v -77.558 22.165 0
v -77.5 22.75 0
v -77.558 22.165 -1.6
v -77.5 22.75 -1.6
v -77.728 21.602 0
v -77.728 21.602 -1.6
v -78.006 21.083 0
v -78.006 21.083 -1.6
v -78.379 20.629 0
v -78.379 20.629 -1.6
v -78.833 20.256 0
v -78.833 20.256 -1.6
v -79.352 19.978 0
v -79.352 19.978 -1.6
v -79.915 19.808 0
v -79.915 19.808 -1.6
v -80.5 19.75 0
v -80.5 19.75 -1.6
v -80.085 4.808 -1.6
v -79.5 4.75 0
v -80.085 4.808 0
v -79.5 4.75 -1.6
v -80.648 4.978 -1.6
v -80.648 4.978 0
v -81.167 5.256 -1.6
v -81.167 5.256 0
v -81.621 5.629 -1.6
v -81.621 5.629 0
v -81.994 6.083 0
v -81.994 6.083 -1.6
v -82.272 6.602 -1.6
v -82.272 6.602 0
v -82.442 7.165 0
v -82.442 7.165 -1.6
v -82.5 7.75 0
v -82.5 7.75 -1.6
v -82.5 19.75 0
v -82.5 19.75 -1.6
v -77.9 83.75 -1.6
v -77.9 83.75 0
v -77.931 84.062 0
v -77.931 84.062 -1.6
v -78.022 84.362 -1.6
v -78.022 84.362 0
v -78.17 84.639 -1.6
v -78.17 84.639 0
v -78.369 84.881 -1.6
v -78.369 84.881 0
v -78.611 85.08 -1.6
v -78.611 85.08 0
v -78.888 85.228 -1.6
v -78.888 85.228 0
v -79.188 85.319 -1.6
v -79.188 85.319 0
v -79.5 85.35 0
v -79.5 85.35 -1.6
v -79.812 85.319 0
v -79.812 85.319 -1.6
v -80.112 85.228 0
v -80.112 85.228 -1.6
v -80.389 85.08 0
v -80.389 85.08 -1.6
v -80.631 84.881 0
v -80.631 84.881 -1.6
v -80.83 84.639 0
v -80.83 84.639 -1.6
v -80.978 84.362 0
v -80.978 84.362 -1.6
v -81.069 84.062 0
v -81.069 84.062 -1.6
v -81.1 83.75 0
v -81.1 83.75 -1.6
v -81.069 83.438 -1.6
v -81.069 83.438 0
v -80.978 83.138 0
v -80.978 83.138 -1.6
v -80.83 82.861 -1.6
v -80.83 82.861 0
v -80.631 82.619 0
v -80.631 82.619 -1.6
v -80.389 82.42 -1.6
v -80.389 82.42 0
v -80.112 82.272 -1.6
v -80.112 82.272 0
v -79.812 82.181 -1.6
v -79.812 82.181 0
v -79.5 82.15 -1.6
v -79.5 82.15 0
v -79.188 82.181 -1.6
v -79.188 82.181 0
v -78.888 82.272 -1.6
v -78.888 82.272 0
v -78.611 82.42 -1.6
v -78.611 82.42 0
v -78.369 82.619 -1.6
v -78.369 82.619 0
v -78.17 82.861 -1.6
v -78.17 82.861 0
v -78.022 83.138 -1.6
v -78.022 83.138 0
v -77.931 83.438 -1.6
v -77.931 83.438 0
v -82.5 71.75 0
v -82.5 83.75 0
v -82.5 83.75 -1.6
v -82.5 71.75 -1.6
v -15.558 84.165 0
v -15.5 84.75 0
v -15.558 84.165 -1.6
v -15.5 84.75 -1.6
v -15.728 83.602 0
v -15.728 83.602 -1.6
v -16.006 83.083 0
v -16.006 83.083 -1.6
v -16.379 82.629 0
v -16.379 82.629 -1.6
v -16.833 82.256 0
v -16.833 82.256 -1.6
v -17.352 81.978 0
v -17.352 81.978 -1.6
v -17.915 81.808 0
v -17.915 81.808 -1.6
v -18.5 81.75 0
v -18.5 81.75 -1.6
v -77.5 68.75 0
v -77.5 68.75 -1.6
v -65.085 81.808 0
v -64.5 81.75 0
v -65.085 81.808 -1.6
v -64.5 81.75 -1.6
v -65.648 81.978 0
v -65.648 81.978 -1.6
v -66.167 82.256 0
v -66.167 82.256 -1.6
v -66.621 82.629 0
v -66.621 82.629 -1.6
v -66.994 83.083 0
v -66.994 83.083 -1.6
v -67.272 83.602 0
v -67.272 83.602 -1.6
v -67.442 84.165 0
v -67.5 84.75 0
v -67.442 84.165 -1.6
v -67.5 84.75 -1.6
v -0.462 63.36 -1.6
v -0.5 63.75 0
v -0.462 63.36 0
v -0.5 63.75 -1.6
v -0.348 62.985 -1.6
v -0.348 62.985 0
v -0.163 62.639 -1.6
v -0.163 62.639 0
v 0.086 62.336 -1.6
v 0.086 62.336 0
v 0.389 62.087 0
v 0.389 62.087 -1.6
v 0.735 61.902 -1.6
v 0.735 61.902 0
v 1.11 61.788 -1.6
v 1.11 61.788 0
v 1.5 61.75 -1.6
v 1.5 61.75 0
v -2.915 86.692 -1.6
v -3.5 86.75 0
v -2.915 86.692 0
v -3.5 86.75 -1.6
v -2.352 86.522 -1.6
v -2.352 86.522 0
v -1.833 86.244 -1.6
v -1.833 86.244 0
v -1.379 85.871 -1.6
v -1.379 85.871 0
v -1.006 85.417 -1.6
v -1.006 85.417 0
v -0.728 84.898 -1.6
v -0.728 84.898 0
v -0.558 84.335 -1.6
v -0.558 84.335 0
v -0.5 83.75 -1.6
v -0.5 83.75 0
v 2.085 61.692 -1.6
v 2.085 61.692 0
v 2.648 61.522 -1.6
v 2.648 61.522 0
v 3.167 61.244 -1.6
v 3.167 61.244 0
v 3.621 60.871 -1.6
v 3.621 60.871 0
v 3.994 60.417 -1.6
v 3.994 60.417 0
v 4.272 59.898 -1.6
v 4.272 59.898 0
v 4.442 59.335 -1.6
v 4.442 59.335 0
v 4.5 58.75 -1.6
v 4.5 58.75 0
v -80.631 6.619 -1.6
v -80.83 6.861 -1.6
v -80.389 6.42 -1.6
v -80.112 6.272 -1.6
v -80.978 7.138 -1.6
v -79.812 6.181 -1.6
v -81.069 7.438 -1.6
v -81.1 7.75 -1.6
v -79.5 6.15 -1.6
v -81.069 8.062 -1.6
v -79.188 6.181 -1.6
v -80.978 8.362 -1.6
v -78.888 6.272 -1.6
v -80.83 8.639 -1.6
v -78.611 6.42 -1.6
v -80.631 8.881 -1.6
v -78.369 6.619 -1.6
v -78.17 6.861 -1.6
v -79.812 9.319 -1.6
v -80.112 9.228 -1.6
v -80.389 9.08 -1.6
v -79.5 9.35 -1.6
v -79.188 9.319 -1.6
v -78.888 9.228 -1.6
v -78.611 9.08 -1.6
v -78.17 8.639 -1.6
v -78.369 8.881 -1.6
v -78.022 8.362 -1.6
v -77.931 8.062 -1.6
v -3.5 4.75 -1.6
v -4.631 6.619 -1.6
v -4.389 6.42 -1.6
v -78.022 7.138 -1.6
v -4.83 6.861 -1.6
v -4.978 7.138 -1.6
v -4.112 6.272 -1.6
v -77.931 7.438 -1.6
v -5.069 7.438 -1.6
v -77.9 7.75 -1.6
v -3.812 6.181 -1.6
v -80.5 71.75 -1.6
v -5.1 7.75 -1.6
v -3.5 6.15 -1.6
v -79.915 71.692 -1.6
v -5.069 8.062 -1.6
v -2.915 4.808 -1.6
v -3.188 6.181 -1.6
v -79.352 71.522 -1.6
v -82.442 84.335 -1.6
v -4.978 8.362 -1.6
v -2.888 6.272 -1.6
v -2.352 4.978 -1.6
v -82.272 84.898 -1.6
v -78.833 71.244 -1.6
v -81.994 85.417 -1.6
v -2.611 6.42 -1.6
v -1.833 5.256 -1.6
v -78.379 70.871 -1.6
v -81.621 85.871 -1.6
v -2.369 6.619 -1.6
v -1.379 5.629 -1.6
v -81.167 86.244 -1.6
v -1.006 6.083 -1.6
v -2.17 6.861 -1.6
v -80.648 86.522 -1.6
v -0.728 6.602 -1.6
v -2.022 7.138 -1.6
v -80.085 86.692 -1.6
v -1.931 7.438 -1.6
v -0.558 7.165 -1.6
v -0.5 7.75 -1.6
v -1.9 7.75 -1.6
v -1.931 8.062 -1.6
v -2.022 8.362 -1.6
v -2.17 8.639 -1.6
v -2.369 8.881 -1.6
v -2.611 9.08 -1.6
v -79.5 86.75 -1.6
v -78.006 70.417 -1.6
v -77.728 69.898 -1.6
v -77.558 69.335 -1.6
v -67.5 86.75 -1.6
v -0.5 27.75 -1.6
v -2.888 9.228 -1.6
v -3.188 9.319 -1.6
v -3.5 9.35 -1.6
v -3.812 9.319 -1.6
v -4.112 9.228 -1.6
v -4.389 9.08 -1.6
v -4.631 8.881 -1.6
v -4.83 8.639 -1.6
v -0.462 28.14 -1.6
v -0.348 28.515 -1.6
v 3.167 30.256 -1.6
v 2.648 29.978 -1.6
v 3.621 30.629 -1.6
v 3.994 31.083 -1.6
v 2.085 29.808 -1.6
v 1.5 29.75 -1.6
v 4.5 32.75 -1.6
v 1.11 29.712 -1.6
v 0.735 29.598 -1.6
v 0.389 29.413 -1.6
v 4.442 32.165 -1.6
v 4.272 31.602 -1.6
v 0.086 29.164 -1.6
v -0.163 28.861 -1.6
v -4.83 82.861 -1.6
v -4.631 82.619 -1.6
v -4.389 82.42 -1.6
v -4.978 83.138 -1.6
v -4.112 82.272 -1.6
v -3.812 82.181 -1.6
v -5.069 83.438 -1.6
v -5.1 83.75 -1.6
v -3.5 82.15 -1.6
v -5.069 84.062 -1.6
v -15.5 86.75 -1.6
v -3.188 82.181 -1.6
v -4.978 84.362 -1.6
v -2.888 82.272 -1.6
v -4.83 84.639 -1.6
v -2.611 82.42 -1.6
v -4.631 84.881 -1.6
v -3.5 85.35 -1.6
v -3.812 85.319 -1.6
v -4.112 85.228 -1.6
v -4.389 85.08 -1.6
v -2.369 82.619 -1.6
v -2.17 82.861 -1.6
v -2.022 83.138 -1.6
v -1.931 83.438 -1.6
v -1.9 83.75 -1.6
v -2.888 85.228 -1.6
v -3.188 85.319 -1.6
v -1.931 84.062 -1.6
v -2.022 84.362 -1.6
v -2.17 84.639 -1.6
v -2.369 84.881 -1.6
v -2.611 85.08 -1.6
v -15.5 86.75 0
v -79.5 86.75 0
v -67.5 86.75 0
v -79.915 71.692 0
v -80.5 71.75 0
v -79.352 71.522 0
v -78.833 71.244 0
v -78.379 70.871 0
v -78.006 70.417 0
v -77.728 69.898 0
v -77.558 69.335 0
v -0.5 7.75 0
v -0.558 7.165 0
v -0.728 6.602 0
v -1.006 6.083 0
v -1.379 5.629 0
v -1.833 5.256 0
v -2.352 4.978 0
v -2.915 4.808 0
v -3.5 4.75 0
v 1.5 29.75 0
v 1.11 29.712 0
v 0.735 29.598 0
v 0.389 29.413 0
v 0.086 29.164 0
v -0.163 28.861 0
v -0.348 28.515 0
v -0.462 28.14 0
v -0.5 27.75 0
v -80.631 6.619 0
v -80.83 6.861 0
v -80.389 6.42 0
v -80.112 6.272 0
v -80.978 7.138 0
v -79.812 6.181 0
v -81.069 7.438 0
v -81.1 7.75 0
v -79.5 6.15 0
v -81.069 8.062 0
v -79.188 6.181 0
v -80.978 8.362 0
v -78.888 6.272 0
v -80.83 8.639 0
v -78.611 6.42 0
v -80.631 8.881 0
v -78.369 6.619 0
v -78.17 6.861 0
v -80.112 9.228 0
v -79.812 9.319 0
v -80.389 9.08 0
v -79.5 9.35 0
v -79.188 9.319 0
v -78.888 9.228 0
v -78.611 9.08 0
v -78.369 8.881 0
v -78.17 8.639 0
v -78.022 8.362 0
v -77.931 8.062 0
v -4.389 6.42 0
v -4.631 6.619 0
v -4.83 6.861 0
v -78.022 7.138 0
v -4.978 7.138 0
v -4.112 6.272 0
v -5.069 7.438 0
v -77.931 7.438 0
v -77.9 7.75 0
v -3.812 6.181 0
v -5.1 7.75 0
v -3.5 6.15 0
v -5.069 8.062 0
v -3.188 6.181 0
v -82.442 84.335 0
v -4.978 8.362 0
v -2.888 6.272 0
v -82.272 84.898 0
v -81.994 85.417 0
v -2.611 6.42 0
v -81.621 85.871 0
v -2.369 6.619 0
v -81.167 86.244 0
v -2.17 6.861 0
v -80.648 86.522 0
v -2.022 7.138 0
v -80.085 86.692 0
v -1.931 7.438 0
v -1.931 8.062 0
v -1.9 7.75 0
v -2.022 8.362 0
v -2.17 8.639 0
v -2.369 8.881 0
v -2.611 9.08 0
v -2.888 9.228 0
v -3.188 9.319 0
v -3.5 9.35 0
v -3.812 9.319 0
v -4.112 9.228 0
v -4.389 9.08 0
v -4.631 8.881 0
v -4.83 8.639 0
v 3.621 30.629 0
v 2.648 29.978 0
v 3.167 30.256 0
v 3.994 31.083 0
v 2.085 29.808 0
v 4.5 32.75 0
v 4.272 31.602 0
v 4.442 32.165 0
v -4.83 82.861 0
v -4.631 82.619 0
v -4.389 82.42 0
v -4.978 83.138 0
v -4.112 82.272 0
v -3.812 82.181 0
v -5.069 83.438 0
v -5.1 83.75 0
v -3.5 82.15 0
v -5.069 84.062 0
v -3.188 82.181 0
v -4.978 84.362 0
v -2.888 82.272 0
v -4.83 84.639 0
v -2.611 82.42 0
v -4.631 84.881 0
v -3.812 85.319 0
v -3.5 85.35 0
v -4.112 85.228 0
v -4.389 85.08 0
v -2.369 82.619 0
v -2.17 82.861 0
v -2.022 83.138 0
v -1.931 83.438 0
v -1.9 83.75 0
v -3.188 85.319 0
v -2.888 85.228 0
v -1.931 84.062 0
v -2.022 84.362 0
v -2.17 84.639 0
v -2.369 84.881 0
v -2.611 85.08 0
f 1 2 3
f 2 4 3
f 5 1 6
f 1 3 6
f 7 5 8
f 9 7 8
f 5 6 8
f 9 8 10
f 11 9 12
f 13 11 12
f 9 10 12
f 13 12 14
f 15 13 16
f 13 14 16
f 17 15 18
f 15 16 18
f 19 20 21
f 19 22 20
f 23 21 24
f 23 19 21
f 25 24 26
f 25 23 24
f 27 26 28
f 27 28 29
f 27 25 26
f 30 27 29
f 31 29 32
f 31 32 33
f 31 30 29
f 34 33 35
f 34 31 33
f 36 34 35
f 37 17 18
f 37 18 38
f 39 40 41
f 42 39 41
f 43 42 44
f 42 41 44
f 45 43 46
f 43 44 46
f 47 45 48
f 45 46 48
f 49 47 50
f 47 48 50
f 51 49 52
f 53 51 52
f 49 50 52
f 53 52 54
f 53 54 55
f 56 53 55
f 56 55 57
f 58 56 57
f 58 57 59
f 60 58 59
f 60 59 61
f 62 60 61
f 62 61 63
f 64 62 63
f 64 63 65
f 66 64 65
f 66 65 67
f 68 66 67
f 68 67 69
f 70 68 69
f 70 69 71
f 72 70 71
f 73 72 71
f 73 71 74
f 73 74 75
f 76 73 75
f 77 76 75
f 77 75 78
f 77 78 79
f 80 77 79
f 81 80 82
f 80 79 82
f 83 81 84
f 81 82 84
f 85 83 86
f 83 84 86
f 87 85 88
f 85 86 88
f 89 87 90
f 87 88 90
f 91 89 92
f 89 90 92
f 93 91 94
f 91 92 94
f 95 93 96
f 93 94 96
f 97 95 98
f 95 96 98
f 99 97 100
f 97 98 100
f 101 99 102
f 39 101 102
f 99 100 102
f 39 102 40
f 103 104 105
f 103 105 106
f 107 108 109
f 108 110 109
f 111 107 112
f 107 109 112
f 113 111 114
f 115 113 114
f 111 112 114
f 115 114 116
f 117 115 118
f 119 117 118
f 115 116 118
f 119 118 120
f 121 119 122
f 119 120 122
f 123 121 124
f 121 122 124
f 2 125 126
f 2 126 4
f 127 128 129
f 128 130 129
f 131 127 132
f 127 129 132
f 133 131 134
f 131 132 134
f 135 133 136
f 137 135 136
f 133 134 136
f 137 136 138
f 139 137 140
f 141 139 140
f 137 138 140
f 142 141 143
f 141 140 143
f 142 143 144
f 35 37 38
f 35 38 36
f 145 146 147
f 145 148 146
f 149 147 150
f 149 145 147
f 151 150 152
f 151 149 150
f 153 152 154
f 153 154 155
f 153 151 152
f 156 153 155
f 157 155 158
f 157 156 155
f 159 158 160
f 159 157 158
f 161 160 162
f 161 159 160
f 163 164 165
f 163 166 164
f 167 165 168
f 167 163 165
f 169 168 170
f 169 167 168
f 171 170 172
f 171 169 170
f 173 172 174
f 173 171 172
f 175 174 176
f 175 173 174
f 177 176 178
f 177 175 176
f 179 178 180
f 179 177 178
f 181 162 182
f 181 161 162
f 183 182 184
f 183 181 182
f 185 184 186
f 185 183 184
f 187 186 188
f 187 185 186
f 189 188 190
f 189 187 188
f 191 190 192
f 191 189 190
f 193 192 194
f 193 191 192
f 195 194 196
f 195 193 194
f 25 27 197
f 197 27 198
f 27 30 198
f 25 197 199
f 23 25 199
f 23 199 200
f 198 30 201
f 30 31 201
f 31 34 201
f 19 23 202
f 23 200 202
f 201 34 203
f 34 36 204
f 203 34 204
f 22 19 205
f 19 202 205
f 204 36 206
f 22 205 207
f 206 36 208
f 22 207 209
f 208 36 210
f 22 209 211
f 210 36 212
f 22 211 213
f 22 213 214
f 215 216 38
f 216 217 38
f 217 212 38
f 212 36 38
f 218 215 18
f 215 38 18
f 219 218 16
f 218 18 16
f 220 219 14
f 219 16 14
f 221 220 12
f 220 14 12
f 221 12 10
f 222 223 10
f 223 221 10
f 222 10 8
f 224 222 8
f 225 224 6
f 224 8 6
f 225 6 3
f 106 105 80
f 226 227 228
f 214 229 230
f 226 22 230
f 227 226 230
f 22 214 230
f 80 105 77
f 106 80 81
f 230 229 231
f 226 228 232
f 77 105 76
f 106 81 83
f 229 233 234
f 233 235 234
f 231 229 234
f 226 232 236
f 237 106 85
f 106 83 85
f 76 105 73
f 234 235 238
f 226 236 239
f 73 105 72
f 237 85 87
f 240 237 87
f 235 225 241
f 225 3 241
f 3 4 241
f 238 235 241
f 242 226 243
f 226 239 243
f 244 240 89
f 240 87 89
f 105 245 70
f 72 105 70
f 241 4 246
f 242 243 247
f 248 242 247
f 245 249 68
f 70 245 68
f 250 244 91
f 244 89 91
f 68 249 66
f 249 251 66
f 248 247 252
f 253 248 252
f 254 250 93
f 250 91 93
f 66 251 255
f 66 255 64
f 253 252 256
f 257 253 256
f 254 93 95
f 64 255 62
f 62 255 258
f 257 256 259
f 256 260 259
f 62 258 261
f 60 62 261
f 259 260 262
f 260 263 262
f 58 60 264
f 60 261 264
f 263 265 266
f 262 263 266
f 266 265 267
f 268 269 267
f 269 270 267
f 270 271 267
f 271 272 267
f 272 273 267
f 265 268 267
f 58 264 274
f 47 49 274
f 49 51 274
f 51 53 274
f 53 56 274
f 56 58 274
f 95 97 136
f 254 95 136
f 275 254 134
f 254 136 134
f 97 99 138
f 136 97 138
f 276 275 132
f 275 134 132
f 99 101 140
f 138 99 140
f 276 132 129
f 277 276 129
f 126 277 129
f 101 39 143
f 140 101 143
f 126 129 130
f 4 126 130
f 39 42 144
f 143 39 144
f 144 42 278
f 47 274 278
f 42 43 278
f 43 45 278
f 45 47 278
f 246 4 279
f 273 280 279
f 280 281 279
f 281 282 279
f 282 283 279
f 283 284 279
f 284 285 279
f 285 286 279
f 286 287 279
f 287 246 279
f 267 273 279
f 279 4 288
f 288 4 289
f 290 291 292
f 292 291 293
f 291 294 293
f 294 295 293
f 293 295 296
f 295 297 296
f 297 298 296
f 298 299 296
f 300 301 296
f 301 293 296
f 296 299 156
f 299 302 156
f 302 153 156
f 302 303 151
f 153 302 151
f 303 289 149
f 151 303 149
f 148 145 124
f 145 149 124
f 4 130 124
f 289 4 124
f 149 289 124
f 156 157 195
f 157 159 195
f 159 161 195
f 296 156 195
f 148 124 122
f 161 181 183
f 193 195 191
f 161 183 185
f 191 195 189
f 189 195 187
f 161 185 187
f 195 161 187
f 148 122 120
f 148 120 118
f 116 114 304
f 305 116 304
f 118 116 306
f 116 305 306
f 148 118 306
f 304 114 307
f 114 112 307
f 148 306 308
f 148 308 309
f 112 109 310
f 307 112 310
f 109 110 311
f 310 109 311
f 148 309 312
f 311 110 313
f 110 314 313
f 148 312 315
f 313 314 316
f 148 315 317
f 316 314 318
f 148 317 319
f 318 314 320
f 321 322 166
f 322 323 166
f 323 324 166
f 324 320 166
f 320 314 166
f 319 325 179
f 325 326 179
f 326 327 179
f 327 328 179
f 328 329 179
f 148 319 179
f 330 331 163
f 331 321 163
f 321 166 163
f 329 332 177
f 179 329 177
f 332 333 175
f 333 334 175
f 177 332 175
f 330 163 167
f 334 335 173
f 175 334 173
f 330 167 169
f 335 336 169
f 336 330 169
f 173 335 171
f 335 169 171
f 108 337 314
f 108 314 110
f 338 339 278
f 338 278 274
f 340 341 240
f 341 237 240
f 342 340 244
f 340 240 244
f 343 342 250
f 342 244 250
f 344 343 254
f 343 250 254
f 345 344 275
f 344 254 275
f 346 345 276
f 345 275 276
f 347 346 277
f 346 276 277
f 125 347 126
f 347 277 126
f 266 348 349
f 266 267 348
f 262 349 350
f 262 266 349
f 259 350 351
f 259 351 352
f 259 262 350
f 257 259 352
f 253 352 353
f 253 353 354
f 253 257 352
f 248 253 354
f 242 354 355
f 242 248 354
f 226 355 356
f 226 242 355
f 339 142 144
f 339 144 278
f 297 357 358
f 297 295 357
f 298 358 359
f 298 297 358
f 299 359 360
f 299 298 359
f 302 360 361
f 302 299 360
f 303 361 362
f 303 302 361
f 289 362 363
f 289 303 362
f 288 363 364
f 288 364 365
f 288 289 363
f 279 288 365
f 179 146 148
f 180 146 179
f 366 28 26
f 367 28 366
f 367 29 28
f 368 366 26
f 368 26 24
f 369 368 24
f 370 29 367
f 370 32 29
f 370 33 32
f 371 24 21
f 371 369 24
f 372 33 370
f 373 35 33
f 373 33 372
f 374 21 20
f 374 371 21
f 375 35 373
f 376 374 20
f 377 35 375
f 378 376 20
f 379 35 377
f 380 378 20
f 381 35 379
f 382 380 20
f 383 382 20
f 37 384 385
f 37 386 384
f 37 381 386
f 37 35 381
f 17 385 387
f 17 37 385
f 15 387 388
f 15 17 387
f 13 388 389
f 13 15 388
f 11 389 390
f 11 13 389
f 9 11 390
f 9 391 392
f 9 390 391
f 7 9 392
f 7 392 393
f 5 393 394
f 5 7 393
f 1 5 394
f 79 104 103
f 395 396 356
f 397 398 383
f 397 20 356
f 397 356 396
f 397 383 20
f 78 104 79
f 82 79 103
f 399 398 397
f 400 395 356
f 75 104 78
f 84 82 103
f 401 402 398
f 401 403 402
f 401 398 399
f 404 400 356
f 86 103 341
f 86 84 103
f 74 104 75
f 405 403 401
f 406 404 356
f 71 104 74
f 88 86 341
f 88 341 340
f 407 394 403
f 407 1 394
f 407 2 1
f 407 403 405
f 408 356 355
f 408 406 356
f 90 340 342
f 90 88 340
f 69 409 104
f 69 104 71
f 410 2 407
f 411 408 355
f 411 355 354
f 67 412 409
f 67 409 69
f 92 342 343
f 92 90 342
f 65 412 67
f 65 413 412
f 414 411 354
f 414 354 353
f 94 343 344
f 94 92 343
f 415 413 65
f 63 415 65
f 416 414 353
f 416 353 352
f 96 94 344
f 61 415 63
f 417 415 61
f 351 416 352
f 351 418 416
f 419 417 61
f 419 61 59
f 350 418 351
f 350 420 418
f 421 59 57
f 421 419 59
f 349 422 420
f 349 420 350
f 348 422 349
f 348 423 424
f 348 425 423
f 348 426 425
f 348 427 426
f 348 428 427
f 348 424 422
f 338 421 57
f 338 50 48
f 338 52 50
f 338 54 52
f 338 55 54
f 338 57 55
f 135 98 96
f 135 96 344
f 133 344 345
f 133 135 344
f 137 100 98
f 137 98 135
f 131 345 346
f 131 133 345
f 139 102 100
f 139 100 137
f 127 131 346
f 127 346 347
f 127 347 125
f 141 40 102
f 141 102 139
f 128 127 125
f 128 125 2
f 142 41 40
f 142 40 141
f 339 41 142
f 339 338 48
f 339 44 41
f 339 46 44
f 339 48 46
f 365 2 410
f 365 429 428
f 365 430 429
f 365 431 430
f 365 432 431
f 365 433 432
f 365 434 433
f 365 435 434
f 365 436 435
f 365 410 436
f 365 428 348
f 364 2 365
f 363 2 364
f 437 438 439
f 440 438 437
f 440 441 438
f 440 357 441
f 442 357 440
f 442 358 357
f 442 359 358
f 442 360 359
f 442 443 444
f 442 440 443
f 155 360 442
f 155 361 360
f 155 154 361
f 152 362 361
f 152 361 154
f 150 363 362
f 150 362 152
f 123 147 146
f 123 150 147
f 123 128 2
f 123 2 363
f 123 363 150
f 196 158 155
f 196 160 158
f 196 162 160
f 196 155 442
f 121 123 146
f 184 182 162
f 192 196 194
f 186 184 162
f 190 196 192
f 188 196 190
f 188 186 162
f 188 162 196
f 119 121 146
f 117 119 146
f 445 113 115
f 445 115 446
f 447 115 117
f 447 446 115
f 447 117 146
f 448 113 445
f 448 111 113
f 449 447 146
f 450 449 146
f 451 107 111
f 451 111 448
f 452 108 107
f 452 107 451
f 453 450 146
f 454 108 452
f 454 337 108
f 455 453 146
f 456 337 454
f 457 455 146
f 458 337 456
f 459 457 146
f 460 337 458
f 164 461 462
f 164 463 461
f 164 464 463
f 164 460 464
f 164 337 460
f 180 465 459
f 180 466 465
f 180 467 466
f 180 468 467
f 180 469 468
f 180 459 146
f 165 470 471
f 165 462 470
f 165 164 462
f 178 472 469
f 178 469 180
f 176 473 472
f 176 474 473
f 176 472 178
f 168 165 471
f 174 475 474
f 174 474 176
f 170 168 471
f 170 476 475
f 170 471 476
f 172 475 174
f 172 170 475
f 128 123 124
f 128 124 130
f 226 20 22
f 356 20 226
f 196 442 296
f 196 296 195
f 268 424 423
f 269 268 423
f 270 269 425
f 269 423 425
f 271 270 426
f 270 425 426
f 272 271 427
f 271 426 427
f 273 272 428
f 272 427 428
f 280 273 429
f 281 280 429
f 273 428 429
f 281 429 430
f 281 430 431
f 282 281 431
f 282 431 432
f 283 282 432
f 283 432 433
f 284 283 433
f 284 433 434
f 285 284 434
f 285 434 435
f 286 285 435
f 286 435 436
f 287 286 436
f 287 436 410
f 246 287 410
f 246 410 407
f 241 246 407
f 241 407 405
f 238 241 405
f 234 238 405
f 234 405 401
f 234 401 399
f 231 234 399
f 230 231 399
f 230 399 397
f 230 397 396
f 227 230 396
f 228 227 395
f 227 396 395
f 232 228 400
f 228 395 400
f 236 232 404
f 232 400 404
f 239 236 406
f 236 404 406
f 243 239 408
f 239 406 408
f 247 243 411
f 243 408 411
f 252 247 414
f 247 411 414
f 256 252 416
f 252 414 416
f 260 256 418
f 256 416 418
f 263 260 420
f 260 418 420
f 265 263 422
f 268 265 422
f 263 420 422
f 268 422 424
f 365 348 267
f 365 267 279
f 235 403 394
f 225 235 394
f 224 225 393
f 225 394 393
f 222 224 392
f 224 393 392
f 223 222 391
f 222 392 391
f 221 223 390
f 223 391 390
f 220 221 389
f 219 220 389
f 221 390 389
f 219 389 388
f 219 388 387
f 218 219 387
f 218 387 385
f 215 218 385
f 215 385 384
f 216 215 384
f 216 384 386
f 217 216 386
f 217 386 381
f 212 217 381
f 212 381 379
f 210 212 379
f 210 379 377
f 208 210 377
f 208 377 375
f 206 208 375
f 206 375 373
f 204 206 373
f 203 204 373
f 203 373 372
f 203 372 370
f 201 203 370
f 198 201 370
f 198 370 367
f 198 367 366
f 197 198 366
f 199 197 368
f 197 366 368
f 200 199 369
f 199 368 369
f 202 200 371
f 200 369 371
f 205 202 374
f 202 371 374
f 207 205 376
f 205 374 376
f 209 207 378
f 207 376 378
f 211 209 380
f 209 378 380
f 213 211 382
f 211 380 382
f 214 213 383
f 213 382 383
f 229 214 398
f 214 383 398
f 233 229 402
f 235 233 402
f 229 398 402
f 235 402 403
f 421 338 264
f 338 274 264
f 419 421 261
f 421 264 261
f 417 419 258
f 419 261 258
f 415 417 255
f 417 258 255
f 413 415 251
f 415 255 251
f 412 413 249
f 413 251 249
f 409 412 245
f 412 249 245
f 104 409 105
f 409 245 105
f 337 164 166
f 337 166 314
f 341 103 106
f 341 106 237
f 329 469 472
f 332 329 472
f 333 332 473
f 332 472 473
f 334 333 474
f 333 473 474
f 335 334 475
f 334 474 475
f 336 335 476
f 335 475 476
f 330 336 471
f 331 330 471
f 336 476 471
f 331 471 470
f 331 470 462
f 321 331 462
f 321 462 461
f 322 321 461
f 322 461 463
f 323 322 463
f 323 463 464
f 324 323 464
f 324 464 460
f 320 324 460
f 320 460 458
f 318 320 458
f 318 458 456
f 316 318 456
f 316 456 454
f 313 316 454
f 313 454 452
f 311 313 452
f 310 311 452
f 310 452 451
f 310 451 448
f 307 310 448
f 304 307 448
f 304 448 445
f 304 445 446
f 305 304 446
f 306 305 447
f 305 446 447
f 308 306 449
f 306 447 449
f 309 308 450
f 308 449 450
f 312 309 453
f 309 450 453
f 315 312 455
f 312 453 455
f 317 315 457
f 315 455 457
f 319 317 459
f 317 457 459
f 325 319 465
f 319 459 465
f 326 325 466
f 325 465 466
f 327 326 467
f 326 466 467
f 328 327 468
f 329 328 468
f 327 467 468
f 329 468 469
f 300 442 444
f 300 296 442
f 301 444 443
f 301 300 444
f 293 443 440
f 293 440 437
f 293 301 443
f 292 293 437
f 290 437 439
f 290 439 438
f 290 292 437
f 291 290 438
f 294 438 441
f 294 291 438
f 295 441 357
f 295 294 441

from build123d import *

# Parameters (mm, degrees)
BOSS_EXTRUDE1_DEPTH        = 1.6
F_3_2_3_2_DIAMETER_HOLE1_D = 3.2
FILLET1_R                  = 3
FILLET3_R                  = 2


with BuildPart() as part:
    # Sketch1 → Boss-Extrude1 (new body)
    with BuildSketch(Plane.XY):
        Polygon((-15.5, 86.75), (-15.5, 81.75), (-67.5, 81.75), (-67.5, 86.75), (-82.5, 86.75), (-82.5, 71.75), (-77.5, 71.75), (-77.5, 19.75), (-82.5, 19.75), (-82.5, 4.75), (-0.5, 4.75), (-0.5, 29.75), (4.5, 29.75), (4.5, 61.75), (-0.5, 61.75), (-0.5, 86.75), align=None)
    extrude(amount=-BOSS_EXTRUDE1_DEPTH)

    # Ø3.2 (3.2) Diameter Hole1 (through all)
    with Locations(Plane(origin=(0, 0, -1.6), x_dir=(-1, 0, 0), z_dir=(0, 0, -1))):
        with Locations((3.5, 83.75), (3.5, 7.75), (79.5, 7.75), (79.5, 83.75)):
            Hole(F_3_2_3_2_DIAMETER_HOLE1_D / 2)

    # Fillet1
    fillet1_edges = [part.edges().sort_by_distance(p)[0] for p in [
        (4.5, 61.75, -0.8),
        (4.5, 29.75, -0.8),
        (-0.5, 4.75, -0.8),
        (-82.5, 4.75, -0.8),
        (-77.5, 19.75, -0.8),
        (-77.5, 71.75, -0.8),
        (-82.5, 86.75, -0.8),
        (-67.5, 81.75, -0.8),
        (-15.5, 81.75, -0.8),
        (-0.5, 86.75, -0.8),
    ]]
    fillet(fillet1_edges, radius=FILLET1_R)

    # Fillet3
    fillet3_edges = [part.edges().sort_by_distance(p)[0] for p in [
        (-0.5, 29.75, -0.8),
        (-0.5, 61.75, -0.8),
    ]]
    fillet(fillet3_edges, radius=FILLET3_R - 0.0001)  # a hair under: the kernel refuses the full size


solid = part.part
